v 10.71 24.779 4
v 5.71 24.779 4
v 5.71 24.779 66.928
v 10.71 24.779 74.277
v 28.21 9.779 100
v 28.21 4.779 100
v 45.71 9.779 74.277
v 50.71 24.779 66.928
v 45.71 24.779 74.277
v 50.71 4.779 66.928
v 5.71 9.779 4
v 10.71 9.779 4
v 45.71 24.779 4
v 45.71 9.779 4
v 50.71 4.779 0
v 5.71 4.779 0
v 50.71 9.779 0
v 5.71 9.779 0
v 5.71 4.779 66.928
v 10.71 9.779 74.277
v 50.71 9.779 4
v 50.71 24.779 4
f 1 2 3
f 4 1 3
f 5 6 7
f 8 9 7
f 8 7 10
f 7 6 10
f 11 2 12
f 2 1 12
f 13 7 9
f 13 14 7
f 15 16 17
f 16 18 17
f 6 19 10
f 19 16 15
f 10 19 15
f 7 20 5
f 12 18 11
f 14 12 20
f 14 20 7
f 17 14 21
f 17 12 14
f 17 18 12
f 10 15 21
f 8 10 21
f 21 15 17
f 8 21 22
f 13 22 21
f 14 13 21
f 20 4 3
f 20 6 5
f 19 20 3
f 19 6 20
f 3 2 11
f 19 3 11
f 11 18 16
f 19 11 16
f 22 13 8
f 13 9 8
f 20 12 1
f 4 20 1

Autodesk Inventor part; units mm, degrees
ref_plane "YZ Plane" through (0, 0, 0) normal (1, 0, 0) x (0, 1, 0)
ref_plane "XZ Plane" through (0, 0, 0) normal (0, 1, 0) x (-1, 0, 0)
ref_plane "XY Plane" through (0, 0, 0) normal (0, 0, 1) x (1, 0, 0)
sketch "Sketch1" plane through (0, 0, 0) normal (0, 0, 1) x (1, 0, 0)
  line L0 (10.7104, 9.7791) -> (45.7104, 9.7791)
  line L1 (45.7104, 9.7791) -> (45.7104, 24.7791)
  line L2 (10.7104, 9.7791) -> (10.7104, 24.7791)
  line L3 (5.7104, 24.7791) -> (5.7104, 4.7791)
  line L4 (5.7104, 4.7791) -> (50.7104, 4.7791)
  line L5 (50.7104, 4.7791) -> (50.7104, 24.7791)
  line L6 (5.7104, 24.7791) -> (10.7104, 24.7791)
  line L7 (45.7104, 24.7791) -> (50.7104, 24.7791)
  point P0 (0, 0)
  point P1 (28.2104, 9.7791)
  dimension "d0" = 35
  dimension "d1" = 15
  dimension "d2" = 15
  dimension "d29" = 5
extrude "Extrusion1" add sketch "Sketch1" along normal blind 100
sketch "Sketch3" plane through (10.7104, 9.7791, 0) normal (0, 1, 0) x (1, 0, 0)
  line L0 (-5, -100) -> (40, -100) projected
  line L1 (-5, 0) -> (-5, -100) projected
  line L2 (17.5, -100) -> (37.1919, -100) construction
  line L3 (-5, -85.7353) -> (-5, -100)
  line L4 (-5, -100) -> (17.5, -100)
  line L5 (40, 0) -> (40, -100) projected
  line L6 (17.5, -100) -> (37.1919, -100) construction
  line L7 (40, -85.7353) -> (40, -100)
  line L8 (40, -100) -> (17.5, -100)
  line L9 (40, 0) -> (40, -100) projected
  line L10 (17.5, -100) -> (-5, -66.9281)
  line L11 (17.5, -100) -> (40, -66.9281)
  point P0 (-10.7104, 0)
  point P1 (-5, -77.7514)
  point P2 (40, -66.9281)
  dimension "d20" = 40
  dimension "d23" = 40
  dimension "d27" = 55.771
  dimension "d28" = 68.458
extrude "Extrusion5" cut sketch "Sketch3" along normal through all both and the other way through all
sketch "Sketch4" plane through (50.7104, 4.7791, 0) normal (1, 0, 0) x (0, 0, -1)
  line L0 (0, 20) -> (-74.2774, 20) projected
  line L1 (0, 20) -> (-4, 20)
  line L2 (-4, 20) -> (-4, 5)
  line L3 (0, 5) -> (-74.2774, 5) projected
  line L4 (0, 20) -> (0, 5) projected
  line L5 (0, 5) -> (0, 20)
  line L6 (0, 20) -> (0, 5)
  line L7 (-4, 5) -> (0, 5)
  point P0 (0, -4.7791)
  dimension "d24" = 4
extrude "Extrusion6" cut sketch "Sketch4" against normal through all
equation "\"d23\" = d20"
equation "\"BendRadius\" = Thickness"
equation "\"BendReliefWidth\" = Thickness"
equation "\"BendReliefDepth\" = 0.5 * Thickness"
equation "\"CornerReliefSize\" = 4 * Thickness"
equation "\"MinimumRemnant\" = 2 * Thickness"
equation "\"TransitionRadius\" = BendRadius"
equation "\"JacobiRadiusSize\" = BendRadius"
equation "\"GapSize\" = Thickness"
equation "\"Thickness\" = 0.5"
properties part number "middleslide"
